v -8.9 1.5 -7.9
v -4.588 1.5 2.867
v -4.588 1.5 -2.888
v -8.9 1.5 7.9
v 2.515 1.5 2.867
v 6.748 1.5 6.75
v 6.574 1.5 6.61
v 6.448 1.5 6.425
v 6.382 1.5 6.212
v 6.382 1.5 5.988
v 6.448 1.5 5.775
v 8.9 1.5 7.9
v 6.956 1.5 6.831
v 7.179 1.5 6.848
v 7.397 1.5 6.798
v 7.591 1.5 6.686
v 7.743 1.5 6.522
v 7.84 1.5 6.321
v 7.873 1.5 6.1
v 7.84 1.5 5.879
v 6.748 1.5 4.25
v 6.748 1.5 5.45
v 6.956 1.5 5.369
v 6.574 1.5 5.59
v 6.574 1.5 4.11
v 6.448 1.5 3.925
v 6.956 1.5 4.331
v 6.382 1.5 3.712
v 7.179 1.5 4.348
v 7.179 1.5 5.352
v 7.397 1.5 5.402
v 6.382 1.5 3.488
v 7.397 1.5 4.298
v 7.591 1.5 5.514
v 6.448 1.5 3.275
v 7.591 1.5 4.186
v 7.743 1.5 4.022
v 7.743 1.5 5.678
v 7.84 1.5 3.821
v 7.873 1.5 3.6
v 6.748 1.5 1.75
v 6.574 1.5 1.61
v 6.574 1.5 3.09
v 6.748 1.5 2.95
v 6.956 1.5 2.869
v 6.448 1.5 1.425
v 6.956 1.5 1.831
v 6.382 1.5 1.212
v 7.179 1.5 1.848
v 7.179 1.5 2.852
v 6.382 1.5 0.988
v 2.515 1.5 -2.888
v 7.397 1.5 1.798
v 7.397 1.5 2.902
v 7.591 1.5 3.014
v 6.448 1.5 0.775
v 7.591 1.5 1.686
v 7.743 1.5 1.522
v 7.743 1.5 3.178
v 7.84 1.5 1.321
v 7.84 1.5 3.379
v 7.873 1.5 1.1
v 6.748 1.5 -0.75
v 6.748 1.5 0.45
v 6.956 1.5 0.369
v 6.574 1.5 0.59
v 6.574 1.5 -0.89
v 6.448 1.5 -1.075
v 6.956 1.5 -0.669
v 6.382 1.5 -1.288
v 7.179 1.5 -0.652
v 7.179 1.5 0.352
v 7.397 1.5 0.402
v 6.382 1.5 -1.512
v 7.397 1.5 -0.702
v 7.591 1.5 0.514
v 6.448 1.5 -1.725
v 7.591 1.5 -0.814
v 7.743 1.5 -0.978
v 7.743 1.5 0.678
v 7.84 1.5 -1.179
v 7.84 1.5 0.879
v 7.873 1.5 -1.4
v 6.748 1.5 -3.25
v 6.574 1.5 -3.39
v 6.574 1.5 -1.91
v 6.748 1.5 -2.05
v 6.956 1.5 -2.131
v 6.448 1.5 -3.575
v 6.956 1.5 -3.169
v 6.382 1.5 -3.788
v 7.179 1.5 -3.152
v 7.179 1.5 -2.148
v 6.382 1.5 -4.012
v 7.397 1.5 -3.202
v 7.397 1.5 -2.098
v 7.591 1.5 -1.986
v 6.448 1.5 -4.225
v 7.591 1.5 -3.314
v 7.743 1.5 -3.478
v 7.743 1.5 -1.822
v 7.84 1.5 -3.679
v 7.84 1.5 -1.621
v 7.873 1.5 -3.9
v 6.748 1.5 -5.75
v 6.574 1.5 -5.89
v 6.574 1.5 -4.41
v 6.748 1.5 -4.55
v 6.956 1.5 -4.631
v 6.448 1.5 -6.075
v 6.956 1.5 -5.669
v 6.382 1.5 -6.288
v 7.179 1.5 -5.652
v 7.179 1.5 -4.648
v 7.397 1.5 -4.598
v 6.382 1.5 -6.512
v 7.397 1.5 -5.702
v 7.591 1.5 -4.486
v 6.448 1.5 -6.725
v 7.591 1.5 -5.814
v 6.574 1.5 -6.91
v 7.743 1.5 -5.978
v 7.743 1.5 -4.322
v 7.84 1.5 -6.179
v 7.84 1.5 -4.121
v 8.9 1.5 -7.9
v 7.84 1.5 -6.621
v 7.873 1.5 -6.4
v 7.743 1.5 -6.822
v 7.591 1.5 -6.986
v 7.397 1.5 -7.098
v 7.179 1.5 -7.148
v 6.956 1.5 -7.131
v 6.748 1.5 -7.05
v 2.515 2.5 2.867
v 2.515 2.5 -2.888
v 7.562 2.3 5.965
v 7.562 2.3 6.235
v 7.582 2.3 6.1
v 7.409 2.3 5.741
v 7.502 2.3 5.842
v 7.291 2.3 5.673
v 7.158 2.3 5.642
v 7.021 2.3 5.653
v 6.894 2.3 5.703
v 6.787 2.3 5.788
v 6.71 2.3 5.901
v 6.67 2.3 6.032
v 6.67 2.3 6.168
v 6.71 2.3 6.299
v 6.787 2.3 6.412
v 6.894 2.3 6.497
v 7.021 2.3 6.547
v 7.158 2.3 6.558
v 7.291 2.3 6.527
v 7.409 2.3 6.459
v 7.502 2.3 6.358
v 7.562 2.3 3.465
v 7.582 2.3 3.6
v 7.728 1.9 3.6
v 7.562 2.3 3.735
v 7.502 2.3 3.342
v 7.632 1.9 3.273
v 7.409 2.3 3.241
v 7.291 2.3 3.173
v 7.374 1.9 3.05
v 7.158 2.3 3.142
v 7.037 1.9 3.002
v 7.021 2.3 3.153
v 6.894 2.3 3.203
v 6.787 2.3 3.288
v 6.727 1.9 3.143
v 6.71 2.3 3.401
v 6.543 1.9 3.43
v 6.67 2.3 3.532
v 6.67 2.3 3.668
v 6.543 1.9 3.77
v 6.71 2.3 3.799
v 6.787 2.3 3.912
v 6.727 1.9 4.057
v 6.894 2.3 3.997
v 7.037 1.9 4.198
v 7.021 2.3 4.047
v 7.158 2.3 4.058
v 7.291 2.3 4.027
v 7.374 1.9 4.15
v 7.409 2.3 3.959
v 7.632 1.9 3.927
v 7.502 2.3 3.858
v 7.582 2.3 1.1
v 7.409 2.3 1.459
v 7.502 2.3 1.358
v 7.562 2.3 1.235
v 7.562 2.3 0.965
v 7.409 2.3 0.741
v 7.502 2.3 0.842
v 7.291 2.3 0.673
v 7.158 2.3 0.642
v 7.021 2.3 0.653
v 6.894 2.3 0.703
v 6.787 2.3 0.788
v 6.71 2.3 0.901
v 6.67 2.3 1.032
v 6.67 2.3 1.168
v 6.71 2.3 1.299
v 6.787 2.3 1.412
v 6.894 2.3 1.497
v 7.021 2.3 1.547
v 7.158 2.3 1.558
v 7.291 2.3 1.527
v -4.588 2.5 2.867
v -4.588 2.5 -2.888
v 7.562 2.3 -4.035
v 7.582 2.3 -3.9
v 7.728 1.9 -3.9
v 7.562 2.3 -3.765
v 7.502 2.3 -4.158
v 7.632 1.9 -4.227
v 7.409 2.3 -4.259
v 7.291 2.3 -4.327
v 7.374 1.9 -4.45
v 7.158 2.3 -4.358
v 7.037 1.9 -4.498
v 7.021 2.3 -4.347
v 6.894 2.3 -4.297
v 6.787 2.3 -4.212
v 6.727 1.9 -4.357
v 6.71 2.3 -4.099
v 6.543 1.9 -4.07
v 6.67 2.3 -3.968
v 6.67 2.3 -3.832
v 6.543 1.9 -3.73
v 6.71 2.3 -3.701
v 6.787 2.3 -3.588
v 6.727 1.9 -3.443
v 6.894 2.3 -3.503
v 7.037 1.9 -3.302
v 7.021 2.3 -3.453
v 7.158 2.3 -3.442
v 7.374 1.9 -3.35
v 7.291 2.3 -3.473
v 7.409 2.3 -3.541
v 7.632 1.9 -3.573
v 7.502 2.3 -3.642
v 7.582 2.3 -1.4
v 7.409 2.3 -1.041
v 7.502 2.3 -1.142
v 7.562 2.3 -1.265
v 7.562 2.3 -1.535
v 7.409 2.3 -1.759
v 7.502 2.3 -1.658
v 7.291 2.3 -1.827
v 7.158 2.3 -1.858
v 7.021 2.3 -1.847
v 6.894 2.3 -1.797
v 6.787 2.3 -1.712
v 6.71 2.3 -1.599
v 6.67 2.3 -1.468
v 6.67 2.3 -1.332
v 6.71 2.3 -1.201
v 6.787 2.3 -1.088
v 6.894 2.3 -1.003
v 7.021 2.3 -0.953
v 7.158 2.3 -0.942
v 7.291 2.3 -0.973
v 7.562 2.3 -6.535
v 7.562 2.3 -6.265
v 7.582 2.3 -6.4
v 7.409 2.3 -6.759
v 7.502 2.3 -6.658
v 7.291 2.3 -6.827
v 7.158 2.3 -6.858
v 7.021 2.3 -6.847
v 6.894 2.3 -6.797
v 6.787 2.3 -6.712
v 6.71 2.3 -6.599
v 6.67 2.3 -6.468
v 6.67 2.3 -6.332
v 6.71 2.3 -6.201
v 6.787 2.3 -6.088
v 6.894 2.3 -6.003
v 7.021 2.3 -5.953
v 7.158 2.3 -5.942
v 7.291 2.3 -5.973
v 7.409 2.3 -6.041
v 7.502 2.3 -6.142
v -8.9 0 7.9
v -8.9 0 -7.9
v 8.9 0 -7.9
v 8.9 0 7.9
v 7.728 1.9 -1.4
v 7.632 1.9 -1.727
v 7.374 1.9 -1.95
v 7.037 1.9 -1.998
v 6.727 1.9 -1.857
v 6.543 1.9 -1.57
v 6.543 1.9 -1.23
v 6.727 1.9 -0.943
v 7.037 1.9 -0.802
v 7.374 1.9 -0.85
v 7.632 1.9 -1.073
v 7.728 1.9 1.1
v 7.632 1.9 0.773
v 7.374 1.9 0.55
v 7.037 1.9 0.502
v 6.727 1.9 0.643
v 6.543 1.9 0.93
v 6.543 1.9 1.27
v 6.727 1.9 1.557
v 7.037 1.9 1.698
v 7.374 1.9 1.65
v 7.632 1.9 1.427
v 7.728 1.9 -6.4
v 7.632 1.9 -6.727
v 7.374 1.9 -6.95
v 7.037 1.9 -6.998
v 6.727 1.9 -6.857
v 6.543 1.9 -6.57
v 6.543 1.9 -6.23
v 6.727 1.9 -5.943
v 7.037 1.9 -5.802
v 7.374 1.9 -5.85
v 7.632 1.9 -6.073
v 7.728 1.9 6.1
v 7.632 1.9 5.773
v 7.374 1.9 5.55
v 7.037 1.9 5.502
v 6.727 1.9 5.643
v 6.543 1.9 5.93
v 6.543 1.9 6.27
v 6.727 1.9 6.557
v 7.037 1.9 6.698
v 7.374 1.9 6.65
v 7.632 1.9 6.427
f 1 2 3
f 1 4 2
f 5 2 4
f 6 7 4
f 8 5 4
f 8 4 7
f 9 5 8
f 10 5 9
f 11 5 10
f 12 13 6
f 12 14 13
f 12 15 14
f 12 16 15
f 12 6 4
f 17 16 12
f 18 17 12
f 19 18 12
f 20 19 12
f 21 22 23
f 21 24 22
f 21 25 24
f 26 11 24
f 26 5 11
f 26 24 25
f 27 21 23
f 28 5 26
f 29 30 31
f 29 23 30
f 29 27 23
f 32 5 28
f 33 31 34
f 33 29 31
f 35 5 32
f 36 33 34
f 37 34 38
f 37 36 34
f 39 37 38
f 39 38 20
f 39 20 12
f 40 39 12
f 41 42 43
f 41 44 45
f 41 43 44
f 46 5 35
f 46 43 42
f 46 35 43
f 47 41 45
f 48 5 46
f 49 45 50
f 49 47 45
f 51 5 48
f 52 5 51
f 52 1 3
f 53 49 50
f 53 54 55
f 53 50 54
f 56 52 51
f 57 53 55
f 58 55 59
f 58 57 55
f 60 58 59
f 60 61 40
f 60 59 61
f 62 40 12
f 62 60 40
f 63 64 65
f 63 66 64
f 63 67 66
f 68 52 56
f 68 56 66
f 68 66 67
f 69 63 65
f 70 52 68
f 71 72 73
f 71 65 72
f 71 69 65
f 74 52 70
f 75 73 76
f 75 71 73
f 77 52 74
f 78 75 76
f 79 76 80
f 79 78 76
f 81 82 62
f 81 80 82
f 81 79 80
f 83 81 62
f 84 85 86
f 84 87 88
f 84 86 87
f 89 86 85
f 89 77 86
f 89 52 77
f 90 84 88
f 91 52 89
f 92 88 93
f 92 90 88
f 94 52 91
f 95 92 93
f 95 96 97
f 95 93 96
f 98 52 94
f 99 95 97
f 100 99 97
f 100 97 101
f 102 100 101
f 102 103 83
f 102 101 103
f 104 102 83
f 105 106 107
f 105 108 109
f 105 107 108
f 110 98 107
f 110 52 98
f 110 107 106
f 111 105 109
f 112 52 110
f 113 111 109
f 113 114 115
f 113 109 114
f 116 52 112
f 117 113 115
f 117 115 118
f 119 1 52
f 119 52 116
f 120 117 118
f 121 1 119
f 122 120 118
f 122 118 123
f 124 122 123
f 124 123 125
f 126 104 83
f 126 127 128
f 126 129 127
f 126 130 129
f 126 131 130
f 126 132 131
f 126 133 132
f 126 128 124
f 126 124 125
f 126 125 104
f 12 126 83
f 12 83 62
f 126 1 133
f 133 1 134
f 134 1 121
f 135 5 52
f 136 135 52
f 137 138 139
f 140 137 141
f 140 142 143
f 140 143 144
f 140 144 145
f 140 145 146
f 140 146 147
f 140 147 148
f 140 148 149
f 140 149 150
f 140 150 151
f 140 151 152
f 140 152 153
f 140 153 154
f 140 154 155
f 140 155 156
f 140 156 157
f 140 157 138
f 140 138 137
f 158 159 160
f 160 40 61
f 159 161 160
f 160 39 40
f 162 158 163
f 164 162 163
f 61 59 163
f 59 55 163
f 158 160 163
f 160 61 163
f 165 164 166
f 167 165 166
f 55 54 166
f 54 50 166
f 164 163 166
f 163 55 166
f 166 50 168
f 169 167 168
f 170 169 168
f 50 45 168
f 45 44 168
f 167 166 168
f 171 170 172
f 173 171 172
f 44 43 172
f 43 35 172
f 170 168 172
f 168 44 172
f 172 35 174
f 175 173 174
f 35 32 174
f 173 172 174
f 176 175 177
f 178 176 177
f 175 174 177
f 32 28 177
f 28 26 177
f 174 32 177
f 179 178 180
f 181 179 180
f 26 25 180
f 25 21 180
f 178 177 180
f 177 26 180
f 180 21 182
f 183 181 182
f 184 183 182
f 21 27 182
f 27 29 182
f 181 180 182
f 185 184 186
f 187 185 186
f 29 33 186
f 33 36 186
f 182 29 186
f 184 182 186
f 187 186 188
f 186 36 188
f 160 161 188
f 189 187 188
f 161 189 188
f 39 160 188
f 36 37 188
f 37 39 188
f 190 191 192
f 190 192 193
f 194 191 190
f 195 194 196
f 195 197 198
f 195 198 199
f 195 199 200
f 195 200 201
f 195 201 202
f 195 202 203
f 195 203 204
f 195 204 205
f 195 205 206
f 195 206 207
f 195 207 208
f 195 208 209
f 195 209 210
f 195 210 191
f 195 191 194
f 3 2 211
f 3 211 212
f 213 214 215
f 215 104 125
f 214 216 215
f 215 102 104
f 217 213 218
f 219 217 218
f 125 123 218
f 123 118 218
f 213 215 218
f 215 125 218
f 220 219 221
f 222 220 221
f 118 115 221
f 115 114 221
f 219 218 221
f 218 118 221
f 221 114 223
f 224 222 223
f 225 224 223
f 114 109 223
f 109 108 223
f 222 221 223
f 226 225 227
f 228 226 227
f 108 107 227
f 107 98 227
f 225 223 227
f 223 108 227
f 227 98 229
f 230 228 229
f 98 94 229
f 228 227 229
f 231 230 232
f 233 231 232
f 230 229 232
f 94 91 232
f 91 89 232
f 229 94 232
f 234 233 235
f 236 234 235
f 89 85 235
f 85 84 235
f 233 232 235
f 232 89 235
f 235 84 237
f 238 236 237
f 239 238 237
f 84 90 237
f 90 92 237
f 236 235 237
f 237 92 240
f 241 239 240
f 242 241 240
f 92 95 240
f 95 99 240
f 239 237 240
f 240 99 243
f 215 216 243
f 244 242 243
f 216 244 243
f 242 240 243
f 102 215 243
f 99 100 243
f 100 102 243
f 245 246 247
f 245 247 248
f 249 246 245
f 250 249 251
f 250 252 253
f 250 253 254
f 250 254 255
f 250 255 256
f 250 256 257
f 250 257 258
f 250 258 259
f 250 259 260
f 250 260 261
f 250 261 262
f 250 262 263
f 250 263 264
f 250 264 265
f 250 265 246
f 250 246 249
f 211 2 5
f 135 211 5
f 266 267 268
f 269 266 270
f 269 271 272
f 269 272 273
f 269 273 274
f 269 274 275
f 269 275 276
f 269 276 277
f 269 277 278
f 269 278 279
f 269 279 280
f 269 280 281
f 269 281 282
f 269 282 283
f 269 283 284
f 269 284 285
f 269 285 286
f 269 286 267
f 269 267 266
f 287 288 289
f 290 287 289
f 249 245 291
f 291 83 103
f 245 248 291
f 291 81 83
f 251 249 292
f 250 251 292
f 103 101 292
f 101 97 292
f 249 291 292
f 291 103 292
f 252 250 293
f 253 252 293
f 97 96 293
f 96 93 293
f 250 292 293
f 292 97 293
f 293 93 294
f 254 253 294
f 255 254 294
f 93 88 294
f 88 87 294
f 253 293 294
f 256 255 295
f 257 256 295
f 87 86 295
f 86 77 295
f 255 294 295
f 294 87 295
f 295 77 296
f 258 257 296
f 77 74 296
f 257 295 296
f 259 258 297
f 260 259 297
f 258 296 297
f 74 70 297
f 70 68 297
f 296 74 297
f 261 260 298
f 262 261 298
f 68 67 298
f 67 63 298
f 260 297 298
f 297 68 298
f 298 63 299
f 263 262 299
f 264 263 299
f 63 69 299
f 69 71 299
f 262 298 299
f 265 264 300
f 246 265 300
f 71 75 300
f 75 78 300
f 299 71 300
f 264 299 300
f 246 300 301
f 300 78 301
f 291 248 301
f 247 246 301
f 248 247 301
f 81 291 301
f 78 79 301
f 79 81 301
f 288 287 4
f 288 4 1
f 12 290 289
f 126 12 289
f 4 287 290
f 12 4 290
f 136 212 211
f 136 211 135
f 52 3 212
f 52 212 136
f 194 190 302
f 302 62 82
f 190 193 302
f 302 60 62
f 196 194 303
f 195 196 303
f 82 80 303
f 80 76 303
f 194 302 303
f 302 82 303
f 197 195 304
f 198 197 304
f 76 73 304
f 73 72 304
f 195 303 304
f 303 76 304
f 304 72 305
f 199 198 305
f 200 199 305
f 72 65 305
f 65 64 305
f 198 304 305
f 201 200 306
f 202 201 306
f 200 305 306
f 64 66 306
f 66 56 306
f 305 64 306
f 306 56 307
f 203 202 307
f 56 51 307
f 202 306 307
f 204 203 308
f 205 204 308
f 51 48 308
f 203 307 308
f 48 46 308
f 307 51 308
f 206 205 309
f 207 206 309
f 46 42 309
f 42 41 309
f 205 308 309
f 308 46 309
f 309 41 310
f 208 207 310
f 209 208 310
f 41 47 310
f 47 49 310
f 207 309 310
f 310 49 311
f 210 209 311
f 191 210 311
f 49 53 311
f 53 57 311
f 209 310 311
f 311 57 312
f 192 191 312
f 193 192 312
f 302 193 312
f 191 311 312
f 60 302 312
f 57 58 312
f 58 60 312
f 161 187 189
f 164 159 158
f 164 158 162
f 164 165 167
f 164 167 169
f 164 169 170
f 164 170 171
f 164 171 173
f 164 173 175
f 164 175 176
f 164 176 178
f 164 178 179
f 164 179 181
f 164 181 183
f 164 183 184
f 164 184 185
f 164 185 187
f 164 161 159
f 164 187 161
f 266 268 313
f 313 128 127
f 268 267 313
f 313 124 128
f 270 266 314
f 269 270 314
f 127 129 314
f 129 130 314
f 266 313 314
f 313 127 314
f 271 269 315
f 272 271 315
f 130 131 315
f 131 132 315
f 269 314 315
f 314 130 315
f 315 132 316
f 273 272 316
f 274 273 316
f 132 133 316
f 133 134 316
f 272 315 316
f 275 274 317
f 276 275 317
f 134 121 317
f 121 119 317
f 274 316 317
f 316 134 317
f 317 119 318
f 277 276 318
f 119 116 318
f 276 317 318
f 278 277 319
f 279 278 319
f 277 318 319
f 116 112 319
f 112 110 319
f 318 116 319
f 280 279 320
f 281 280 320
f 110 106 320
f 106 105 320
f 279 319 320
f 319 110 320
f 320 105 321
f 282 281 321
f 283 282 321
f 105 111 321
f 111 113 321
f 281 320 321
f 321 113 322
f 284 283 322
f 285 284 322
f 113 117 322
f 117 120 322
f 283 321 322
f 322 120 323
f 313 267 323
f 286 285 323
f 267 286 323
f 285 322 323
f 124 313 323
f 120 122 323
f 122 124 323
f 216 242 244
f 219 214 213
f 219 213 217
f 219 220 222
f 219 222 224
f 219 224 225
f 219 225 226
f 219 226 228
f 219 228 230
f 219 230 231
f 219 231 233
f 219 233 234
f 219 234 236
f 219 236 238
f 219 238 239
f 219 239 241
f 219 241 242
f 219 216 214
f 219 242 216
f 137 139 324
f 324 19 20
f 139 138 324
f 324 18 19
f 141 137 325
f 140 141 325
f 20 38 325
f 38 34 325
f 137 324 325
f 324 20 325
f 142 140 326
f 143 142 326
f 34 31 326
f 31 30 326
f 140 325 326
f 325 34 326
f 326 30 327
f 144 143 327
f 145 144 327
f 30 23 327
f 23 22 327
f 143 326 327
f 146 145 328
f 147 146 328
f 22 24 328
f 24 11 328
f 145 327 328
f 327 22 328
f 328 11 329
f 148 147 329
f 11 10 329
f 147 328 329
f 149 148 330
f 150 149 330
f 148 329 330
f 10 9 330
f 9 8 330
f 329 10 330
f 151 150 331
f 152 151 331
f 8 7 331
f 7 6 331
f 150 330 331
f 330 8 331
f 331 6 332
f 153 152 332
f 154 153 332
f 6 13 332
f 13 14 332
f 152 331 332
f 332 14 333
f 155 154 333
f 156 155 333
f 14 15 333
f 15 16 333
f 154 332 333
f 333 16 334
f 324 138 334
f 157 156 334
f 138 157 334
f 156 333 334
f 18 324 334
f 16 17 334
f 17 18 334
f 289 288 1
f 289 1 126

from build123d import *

# Parameters (mm, degrees)
SKETCH1_W                     = 17.8
SKETCH1_H                     = 15.8
BOSS_EXTRUDE1_DEPTH           = 1.5
SKETCH2_W                     = 7.103176806
SKETCH2_H                     = 5.754981775
BOSS_EXTRUDE2_DEPTH           = 1
SKETCH3_R                     = 0.75
BOSS_EXTRUDE3_DEPTH           = 0.8
BOSS_EXTRUDE3_DRAFT           = 20
BOSS_EXTRUDE3_PROFILE_2_DEPTH = 0.8
BOSS_EXTRUDE3_PROFILE_2_DRAFT = 20
BOSS_EXTRUDE3_PROFILE_3_DEPTH = 0.8
BOSS_EXTRUDE3_PROFILE_3_DRAFT = 20
BOSS_EXTRUDE3_PROFILE_4_DEPTH = 0.8
BOSS_EXTRUDE3_PROFILE_4_DRAFT = 20
BOSS_EXTRUDE3_PROFILE_5_DEPTH = 0.8
BOSS_EXTRUDE3_PROFILE_5_DRAFT = 20
BOSS_EXTRUDE3_PROFILE_6_DEPTH = 0.8
BOSS_EXTRUDE3_PROFILE_6_DRAFT = 20


with BuildPart() as part:
    # Sketch1 → Boss-Extrude1 (new body)
    with BuildSketch(Plane(origin=(0, 0, 0), x_dir=(1, 0, 0), z_dir=(0, 1, 0))):
        Rectangle(SKETCH1_W, SKETCH1_H)
    extrude(amount=BOSS_EXTRUDE1_DEPTH)

    # Sketch2 → Boss-Extrude2 (add)
    with BuildSketch(Plane(origin=(0, 1.5, 0), x_dir=(1, 0, 0), z_dir=(0, 1, 0))):
        with Locations((-1.036299166, 0.010061156)):
            Rectangle(SKETCH2_W, SKETCH2_H)
    extrude(amount=BOSS_EXTRUDE2_DEPTH)


with BuildPart() as boss_extrude3_tool:
    # Sketch3 → Boss-Extrude3 (with draft: the straight prism first)
    with BuildSketch(Plane(origin=(0, 1.5, 0), x_dir=(1, 0, 0), z_dir=(0, 1, 0))):
        with Locations((7.12329912, 6.4)):
            Circle(SKETCH3_R)
    extrude(amount=BOSS_EXTRUDE3_DEPTH)
    # Boss-Extrude3: the draft: its side faces are tilted about the plane it starts from
    boss_extrude3_sides = [boss_extrude3_tool.faces().sort_by_distance(p)[0] for p in [
        (6.37329912, 1.9, -6.4),
    ]]
    draft(boss_extrude3_sides, Plane(origin=(0, 1.5, 0), x_dir=(1, 0, 0), z_dir=(0, 1, 0)), BOSS_EXTRUDE3_DRAFT)


with BuildPart() as part_1:
    add(part.part)

    # Boss-Extrude3: add boss_extrude3_tool
    add(boss_extrude3_tool.part)


with BuildPart() as boss_extrude3_profile_2_tool:
    # Sketch3 → Boss-Extrude3 profile 2 (with draft: the straight prism first)
    with BuildSketch(Plane(origin=(0, 1.5, 0), x_dir=(1, 0, 0), z_dir=(0, 1, 0))):
        with Locations((7.12329912, 3.9)):
            Circle(SKETCH3_R)
    extrude(amount=BOSS_EXTRUDE3_PROFILE_2_DEPTH)
    # Boss-Extrude3 profile 2: the draft: its side faces are tilted about the plane it starts from
    boss_extrude3_profile_2_sides = [boss_extrude3_profile_2_tool.faces().sort_by_distance(p)[0] for p in [
        (6.37329912, 1.9, -3.9),
    ]]
    draft(boss_extrude3_profile_2_sides, Plane(origin=(0, 1.5, 0), x_dir=(1, 0, 0), z_dir=(0, 1, 0)), BOSS_EXTRUDE3_PROFILE_2_DRAFT)


with BuildPart() as part_2:
    add(part_1.part)

    # Boss-Extrude3 profile 2: add boss_extrude3_profile_2_tool
    add(boss_extrude3_profile_2_tool.part)


with BuildPart() as boss_extrude3_profile_3_tool:
    # Sketch3 → Boss-Extrude3 profile 3 (with draft: the straight prism first)
    with BuildSketch(Plane(origin=(0, 1.5, 0), x_dir=(1, 0, 0), z_dir=(0, 1, 0))):
        with Locations((7.12329912, 1.4)):
            Circle(SKETCH3_R)
    extrude(amount=BOSS_EXTRUDE3_PROFILE_3_DEPTH)
    # Boss-Extrude3 profile 3: the draft: its side faces are tilted about the plane it starts from
    boss_extrude3_profile_3_sides = [boss_extrude3_profile_3_tool.faces().sort_by_distance(p)[0] for p in [
        (6.37329912, 1.9, -1.4),
    ]]
    draft(boss_extrude3_profile_3_sides, Plane(origin=(0, 1.5, 0), x_dir=(1, 0, 0), z_dir=(0, 1, 0)), BOSS_EXTRUDE3_PROFILE_3_DRAFT)


with BuildPart() as part_3:
    add(part_2.part)

    # Boss-Extrude3 profile 3: add boss_extrude3_profile_3_tool
    add(boss_extrude3_profile_3_tool.part)


with BuildPart() as boss_extrude3_profile_4_tool:
    # Sketch3 → Boss-Extrude3 profile 4 (with draft: the straight prism first)
    with BuildSketch(Plane(origin=(0, 1.5, 0), x_dir=(1, 0, 0), z_dir=(0, 1, 0))):
        with Locations((7.12329912, -1.1)):
            Circle(SKETCH3_R)
    extrude(amount=BOSS_EXTRUDE3_PROFILE_4_DEPTH)
    # Boss-Extrude3 profile 4: the draft: its side faces are tilted about the plane it starts from
    boss_extrude3_profile_4_sides = [boss_extrude3_profile_4_tool.faces().sort_by_distance(p)[0] for p in [
        (6.37329912, 1.9, 1.1),
    ]]
    draft(boss_extrude3_profile_4_sides, Plane(origin=(0, 1.5, 0), x_dir=(1, 0, 0), z_dir=(0, 1, 0)), BOSS_EXTRUDE3_PROFILE_4_DRAFT)


with BuildPart() as part_4:
    add(part_3.part)

    # Boss-Extrude3 profile 4: add boss_extrude3_profile_4_tool
    add(boss_extrude3_profile_4_tool.part)


with BuildPart() as boss_extrude3_profile_5_tool:
    # Sketch3 → Boss-Extrude3 profile 5 (with draft: the straight prism first)
    with BuildSketch(Plane(origin=(0, 1.5, 0), x_dir=(1, 0, 0), z_dir=(0, 1, 0))):
        with Locations((7.12329912, -3.6)):
            Circle(SKETCH3_R)
    extrude(amount=BOSS_EXTRUDE3_PROFILE_5_DEPTH)
    # Boss-Extrude3 profile 5: the draft: its side faces are tilted about the plane it starts from
    boss_extrude3_profile_5_sides = [boss_extrude3_profile_5_tool.faces().sort_by_distance(p)[0] for p in [
        (6.37329912, 1.9, 3.6),
    ]]
    draft(boss_extrude3_profile_5_sides, Plane(origin=(0, 1.5, 0), x_dir=(1, 0, 0), z_dir=(0, 1, 0)), BOSS_EXTRUDE3_PROFILE_5_DRAFT)


with BuildPart() as part_5:
    add(part_4.part)

    # Boss-Extrude3 profile 5: add boss_extrude3_profile_5_tool
    add(boss_extrude3_profile_5_tool.part)


with BuildPart() as boss_extrude3_profile_6_tool:
    # Sketch3 → Boss-Extrude3 profile 6 (with draft: the straight prism first)
    with BuildSketch(Plane(origin=(0, 1.5, 0), x_dir=(1, 0, 0), z_dir=(0, 1, 0))):
        with Locations((7.12329912, -6.1)):
            Circle(SKETCH3_R)
    extrude(amount=BOSS_EXTRUDE3_PROFILE_6_DEPTH)
    # Boss-Extrude3 profile 6: the draft: its side faces are tilted about the plane it starts from
    boss_extrude3_profile_6_sides = [boss_extrude3_profile_6_tool.faces().sort_by_distance(p)[0] for p in [
        (6.37329912, 1.9, 6.1),
    ]]
    draft(boss_extrude3_profile_6_sides, Plane(origin=(0, 1.5, 0), x_dir=(1, 0, 0), z_dir=(0, 1, 0)), BOSS_EXTRUDE3_PROFILE_6_DRAFT)


with BuildPart() as part_6:
    add(part_5.part)

    # Boss-Extrude3 profile 6: add boss_extrude3_profile_6_tool
    add(boss_extrude3_profile_6_tool.part)


solid = part_6.part
